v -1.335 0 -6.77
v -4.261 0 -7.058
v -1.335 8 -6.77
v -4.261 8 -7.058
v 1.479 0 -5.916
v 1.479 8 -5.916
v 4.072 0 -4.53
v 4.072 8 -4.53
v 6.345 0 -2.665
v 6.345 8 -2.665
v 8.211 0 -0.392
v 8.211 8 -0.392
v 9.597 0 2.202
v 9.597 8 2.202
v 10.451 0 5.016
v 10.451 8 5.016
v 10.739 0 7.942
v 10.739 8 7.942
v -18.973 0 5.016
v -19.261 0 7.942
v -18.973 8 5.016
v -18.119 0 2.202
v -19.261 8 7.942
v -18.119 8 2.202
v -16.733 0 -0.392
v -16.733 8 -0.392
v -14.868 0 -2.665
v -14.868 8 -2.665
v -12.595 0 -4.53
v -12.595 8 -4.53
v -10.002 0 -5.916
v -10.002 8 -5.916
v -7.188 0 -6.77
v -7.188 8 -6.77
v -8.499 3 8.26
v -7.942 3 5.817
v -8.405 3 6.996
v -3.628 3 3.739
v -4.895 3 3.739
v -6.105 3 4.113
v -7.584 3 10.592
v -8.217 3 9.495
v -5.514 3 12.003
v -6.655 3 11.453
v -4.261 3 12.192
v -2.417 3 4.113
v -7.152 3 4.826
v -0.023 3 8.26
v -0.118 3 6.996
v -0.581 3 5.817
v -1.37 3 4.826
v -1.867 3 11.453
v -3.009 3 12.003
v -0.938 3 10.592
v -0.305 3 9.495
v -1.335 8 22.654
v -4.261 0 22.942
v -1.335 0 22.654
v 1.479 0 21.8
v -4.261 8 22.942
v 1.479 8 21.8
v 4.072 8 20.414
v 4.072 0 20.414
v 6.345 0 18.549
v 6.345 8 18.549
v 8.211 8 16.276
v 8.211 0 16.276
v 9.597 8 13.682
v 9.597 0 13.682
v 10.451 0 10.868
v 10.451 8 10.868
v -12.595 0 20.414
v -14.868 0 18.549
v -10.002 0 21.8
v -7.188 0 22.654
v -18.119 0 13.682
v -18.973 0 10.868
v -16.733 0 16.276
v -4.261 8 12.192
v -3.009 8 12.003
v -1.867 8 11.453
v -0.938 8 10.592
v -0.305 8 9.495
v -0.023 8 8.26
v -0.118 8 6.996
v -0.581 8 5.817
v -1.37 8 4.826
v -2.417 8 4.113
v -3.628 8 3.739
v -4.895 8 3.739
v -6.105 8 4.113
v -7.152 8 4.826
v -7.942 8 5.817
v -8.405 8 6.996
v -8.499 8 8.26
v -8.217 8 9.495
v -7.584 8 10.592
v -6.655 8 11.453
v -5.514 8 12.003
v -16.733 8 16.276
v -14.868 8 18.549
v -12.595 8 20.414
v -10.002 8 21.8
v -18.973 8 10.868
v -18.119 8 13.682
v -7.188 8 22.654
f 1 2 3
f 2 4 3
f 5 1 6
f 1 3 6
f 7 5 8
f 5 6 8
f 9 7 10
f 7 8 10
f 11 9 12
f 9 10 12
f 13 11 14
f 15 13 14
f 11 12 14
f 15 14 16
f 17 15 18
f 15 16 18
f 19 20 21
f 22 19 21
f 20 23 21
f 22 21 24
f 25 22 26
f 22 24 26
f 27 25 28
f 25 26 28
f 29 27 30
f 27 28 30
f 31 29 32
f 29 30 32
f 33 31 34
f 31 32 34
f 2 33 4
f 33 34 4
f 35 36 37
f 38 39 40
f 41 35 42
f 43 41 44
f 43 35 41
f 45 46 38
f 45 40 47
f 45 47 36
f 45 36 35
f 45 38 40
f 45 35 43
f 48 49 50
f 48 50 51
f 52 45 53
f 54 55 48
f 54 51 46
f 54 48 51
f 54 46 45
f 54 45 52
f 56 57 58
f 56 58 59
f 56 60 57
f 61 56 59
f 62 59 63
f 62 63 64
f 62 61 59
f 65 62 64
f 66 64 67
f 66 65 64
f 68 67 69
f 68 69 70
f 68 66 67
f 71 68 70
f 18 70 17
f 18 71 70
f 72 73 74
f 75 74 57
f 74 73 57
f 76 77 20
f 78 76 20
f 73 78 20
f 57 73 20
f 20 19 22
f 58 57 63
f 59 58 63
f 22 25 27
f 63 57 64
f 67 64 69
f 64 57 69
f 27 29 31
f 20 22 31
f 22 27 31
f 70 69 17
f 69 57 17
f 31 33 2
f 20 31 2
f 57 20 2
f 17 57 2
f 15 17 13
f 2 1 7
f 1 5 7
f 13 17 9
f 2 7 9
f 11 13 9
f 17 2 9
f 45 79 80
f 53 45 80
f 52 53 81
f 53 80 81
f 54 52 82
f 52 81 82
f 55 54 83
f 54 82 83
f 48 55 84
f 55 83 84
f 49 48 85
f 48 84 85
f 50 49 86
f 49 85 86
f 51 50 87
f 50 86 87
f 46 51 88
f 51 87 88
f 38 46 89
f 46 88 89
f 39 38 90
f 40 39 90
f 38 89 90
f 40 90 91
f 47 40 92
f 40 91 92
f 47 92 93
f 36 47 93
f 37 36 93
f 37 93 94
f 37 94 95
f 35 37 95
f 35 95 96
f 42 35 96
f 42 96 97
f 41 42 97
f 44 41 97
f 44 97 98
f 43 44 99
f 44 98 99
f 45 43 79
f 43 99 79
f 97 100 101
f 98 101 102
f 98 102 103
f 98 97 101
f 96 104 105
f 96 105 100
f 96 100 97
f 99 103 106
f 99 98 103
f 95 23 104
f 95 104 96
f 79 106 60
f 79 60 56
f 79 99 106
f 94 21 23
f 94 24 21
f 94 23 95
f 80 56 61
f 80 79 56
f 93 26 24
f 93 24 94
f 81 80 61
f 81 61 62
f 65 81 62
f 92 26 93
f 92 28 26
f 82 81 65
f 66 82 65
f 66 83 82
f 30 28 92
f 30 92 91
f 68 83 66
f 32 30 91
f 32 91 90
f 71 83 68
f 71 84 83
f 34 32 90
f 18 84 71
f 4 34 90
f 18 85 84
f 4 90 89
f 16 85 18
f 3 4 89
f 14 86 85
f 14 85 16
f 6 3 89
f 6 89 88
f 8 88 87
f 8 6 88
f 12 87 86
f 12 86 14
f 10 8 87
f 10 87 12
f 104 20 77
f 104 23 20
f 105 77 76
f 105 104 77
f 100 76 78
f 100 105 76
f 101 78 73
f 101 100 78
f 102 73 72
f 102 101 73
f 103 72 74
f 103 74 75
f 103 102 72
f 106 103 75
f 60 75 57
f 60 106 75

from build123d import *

# Parameters (mm, degrees)
SKETCH1_W           = 30
SKETCH1_H           = 30
BOSS_EXTRUDE3_DEPTH = 8
SKETCH3_R           = 4.25
CUT_EXTRUDE2_DEPTH  = 5
FILLET2_R           = 15


with BuildPart() as part:
    # Sketch1 → Boss-Extrude3 (new body)
    with BuildSketch(Plane(origin=(0, 0, 0), x_dir=(1, 0, 0), z_dir=(0, 1, 0))):
        with Locations((-4.26121372, -7.941952507)):
            Rectangle(SKETCH1_W, SKETCH1_H)
    extrude(amount=BOSS_EXTRUDE3_DEPTH)

    # Sketch3 → Cut-Extrude2 (cut)
    with BuildSketch(Plane(origin=(0, 8, 0), x_dir=(1, 0, 0), z_dir=(0, 1, 0))):
        with Locations(Location((-4.26121372, -7.941952507, 0), (0, 0, 270))):
            Circle(SKETCH3_R)
    extrude(amount=-CUT_EXTRUDE2_DEPTH, mode=Mode.SUBTRACT)

    # Fillet2
    fillet2_edges = [part.edges().sort_by_distance(p)[0] for p in [
        (10.73878628, 4, 22.941952507),
        (-19.26121372, 4, 22.941952507),
        (-19.26121372, 4, -7.058047493),
        (10.73878628, 4, -7.058047493),
    ]]
    fillet(fillet2_edges, radius=FILLET2_R - 0.0001)  # a hair under: the kernel refuses the full size


solid = part.part
